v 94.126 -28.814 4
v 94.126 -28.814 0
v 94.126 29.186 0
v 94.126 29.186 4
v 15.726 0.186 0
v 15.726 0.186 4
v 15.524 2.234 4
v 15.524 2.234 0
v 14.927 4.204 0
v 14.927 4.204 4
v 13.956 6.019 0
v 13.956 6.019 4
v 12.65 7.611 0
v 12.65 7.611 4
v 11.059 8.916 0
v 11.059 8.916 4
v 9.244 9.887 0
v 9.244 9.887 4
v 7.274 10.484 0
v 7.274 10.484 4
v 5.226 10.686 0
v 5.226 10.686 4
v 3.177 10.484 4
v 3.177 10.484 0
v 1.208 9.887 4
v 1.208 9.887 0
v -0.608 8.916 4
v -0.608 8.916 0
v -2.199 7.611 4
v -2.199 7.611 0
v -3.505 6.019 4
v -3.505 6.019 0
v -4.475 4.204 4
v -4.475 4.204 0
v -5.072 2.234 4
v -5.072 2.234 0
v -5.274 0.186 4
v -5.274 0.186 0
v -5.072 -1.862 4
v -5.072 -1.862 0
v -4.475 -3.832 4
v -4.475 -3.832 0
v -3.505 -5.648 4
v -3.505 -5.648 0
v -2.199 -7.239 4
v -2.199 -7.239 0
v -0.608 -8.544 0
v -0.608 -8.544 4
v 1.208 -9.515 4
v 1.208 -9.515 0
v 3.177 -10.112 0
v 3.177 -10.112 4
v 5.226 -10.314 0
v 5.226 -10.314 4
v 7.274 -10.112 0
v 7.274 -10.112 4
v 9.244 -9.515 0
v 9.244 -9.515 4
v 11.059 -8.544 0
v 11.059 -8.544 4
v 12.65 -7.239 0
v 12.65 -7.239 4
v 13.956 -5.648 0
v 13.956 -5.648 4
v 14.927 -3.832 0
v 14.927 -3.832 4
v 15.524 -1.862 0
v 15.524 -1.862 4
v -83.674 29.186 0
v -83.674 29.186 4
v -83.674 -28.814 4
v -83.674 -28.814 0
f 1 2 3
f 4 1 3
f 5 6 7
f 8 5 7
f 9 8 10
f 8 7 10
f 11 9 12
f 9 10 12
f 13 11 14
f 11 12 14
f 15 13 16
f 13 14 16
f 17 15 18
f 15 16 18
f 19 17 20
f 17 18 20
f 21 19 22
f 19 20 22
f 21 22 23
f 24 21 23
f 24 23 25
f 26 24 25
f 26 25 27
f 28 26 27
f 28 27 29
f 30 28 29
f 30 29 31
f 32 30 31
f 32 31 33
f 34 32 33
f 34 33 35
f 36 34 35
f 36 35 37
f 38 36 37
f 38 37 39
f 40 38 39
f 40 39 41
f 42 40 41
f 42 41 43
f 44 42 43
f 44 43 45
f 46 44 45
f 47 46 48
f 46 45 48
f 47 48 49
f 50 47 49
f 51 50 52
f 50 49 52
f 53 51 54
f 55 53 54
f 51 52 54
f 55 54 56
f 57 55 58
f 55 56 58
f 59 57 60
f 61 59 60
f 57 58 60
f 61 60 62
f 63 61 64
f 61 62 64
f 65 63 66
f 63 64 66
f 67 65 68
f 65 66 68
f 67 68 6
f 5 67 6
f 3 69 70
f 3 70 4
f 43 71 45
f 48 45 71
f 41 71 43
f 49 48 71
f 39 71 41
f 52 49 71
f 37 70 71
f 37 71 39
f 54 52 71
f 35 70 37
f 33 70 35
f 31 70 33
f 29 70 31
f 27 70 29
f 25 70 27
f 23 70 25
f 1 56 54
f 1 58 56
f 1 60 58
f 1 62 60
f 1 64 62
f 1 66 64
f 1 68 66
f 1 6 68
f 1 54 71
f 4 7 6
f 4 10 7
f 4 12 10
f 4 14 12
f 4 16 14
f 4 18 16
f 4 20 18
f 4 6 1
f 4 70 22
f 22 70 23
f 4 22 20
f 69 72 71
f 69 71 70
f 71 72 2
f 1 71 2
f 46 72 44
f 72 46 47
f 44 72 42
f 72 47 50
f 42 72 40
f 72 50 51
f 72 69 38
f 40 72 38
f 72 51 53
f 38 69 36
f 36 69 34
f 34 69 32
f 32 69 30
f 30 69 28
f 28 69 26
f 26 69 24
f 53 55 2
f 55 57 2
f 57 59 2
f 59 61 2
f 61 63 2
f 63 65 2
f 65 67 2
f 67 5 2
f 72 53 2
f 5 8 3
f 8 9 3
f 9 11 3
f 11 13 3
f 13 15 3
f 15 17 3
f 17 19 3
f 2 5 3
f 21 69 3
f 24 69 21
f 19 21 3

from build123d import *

# Parameters (mm, degrees)
SKETCH2_W           = 177.8
SKETCH2_H           = 58
BOSS_EXTRUDE2_DEPTH = 4
CUT_EXTRUDE1_REACH  = 6
SKETCH3_R           = 10.5


with BuildPart() as part:
    # Sketch2 → Boss-Extrude2 (new body)
    with BuildSketch(Plane.XY):
        with Locations((5.225854908, 0.185980872)):
            Rectangle(SKETCH2_W, SKETCH2_H)
    extrude(amount=BOSS_EXTRUDE2_DEPTH)

    # Sketch3 → Cut-Extrude1 (cut, up to next)
    with BuildSketch(Plane.XY.offset(4), mode=Mode.PRIVATE) as cut_extrude1_sk1:
        with Locations((5.225854908, 0.185980872)):
            Circle(SKETCH3_R)
    cut_extrude1_tool1 = extrude(cut_extrude1_sk1.sketch, amount=-CUT_EXTRUDE1_REACH, mode=Mode.PRIVATE) & part.part
    add(cut_extrude1_tool1.solids().sort_by_distance((5.225855, 0.185981, 4))[0], mode=Mode.SUBTRACT)


solid = part.part
